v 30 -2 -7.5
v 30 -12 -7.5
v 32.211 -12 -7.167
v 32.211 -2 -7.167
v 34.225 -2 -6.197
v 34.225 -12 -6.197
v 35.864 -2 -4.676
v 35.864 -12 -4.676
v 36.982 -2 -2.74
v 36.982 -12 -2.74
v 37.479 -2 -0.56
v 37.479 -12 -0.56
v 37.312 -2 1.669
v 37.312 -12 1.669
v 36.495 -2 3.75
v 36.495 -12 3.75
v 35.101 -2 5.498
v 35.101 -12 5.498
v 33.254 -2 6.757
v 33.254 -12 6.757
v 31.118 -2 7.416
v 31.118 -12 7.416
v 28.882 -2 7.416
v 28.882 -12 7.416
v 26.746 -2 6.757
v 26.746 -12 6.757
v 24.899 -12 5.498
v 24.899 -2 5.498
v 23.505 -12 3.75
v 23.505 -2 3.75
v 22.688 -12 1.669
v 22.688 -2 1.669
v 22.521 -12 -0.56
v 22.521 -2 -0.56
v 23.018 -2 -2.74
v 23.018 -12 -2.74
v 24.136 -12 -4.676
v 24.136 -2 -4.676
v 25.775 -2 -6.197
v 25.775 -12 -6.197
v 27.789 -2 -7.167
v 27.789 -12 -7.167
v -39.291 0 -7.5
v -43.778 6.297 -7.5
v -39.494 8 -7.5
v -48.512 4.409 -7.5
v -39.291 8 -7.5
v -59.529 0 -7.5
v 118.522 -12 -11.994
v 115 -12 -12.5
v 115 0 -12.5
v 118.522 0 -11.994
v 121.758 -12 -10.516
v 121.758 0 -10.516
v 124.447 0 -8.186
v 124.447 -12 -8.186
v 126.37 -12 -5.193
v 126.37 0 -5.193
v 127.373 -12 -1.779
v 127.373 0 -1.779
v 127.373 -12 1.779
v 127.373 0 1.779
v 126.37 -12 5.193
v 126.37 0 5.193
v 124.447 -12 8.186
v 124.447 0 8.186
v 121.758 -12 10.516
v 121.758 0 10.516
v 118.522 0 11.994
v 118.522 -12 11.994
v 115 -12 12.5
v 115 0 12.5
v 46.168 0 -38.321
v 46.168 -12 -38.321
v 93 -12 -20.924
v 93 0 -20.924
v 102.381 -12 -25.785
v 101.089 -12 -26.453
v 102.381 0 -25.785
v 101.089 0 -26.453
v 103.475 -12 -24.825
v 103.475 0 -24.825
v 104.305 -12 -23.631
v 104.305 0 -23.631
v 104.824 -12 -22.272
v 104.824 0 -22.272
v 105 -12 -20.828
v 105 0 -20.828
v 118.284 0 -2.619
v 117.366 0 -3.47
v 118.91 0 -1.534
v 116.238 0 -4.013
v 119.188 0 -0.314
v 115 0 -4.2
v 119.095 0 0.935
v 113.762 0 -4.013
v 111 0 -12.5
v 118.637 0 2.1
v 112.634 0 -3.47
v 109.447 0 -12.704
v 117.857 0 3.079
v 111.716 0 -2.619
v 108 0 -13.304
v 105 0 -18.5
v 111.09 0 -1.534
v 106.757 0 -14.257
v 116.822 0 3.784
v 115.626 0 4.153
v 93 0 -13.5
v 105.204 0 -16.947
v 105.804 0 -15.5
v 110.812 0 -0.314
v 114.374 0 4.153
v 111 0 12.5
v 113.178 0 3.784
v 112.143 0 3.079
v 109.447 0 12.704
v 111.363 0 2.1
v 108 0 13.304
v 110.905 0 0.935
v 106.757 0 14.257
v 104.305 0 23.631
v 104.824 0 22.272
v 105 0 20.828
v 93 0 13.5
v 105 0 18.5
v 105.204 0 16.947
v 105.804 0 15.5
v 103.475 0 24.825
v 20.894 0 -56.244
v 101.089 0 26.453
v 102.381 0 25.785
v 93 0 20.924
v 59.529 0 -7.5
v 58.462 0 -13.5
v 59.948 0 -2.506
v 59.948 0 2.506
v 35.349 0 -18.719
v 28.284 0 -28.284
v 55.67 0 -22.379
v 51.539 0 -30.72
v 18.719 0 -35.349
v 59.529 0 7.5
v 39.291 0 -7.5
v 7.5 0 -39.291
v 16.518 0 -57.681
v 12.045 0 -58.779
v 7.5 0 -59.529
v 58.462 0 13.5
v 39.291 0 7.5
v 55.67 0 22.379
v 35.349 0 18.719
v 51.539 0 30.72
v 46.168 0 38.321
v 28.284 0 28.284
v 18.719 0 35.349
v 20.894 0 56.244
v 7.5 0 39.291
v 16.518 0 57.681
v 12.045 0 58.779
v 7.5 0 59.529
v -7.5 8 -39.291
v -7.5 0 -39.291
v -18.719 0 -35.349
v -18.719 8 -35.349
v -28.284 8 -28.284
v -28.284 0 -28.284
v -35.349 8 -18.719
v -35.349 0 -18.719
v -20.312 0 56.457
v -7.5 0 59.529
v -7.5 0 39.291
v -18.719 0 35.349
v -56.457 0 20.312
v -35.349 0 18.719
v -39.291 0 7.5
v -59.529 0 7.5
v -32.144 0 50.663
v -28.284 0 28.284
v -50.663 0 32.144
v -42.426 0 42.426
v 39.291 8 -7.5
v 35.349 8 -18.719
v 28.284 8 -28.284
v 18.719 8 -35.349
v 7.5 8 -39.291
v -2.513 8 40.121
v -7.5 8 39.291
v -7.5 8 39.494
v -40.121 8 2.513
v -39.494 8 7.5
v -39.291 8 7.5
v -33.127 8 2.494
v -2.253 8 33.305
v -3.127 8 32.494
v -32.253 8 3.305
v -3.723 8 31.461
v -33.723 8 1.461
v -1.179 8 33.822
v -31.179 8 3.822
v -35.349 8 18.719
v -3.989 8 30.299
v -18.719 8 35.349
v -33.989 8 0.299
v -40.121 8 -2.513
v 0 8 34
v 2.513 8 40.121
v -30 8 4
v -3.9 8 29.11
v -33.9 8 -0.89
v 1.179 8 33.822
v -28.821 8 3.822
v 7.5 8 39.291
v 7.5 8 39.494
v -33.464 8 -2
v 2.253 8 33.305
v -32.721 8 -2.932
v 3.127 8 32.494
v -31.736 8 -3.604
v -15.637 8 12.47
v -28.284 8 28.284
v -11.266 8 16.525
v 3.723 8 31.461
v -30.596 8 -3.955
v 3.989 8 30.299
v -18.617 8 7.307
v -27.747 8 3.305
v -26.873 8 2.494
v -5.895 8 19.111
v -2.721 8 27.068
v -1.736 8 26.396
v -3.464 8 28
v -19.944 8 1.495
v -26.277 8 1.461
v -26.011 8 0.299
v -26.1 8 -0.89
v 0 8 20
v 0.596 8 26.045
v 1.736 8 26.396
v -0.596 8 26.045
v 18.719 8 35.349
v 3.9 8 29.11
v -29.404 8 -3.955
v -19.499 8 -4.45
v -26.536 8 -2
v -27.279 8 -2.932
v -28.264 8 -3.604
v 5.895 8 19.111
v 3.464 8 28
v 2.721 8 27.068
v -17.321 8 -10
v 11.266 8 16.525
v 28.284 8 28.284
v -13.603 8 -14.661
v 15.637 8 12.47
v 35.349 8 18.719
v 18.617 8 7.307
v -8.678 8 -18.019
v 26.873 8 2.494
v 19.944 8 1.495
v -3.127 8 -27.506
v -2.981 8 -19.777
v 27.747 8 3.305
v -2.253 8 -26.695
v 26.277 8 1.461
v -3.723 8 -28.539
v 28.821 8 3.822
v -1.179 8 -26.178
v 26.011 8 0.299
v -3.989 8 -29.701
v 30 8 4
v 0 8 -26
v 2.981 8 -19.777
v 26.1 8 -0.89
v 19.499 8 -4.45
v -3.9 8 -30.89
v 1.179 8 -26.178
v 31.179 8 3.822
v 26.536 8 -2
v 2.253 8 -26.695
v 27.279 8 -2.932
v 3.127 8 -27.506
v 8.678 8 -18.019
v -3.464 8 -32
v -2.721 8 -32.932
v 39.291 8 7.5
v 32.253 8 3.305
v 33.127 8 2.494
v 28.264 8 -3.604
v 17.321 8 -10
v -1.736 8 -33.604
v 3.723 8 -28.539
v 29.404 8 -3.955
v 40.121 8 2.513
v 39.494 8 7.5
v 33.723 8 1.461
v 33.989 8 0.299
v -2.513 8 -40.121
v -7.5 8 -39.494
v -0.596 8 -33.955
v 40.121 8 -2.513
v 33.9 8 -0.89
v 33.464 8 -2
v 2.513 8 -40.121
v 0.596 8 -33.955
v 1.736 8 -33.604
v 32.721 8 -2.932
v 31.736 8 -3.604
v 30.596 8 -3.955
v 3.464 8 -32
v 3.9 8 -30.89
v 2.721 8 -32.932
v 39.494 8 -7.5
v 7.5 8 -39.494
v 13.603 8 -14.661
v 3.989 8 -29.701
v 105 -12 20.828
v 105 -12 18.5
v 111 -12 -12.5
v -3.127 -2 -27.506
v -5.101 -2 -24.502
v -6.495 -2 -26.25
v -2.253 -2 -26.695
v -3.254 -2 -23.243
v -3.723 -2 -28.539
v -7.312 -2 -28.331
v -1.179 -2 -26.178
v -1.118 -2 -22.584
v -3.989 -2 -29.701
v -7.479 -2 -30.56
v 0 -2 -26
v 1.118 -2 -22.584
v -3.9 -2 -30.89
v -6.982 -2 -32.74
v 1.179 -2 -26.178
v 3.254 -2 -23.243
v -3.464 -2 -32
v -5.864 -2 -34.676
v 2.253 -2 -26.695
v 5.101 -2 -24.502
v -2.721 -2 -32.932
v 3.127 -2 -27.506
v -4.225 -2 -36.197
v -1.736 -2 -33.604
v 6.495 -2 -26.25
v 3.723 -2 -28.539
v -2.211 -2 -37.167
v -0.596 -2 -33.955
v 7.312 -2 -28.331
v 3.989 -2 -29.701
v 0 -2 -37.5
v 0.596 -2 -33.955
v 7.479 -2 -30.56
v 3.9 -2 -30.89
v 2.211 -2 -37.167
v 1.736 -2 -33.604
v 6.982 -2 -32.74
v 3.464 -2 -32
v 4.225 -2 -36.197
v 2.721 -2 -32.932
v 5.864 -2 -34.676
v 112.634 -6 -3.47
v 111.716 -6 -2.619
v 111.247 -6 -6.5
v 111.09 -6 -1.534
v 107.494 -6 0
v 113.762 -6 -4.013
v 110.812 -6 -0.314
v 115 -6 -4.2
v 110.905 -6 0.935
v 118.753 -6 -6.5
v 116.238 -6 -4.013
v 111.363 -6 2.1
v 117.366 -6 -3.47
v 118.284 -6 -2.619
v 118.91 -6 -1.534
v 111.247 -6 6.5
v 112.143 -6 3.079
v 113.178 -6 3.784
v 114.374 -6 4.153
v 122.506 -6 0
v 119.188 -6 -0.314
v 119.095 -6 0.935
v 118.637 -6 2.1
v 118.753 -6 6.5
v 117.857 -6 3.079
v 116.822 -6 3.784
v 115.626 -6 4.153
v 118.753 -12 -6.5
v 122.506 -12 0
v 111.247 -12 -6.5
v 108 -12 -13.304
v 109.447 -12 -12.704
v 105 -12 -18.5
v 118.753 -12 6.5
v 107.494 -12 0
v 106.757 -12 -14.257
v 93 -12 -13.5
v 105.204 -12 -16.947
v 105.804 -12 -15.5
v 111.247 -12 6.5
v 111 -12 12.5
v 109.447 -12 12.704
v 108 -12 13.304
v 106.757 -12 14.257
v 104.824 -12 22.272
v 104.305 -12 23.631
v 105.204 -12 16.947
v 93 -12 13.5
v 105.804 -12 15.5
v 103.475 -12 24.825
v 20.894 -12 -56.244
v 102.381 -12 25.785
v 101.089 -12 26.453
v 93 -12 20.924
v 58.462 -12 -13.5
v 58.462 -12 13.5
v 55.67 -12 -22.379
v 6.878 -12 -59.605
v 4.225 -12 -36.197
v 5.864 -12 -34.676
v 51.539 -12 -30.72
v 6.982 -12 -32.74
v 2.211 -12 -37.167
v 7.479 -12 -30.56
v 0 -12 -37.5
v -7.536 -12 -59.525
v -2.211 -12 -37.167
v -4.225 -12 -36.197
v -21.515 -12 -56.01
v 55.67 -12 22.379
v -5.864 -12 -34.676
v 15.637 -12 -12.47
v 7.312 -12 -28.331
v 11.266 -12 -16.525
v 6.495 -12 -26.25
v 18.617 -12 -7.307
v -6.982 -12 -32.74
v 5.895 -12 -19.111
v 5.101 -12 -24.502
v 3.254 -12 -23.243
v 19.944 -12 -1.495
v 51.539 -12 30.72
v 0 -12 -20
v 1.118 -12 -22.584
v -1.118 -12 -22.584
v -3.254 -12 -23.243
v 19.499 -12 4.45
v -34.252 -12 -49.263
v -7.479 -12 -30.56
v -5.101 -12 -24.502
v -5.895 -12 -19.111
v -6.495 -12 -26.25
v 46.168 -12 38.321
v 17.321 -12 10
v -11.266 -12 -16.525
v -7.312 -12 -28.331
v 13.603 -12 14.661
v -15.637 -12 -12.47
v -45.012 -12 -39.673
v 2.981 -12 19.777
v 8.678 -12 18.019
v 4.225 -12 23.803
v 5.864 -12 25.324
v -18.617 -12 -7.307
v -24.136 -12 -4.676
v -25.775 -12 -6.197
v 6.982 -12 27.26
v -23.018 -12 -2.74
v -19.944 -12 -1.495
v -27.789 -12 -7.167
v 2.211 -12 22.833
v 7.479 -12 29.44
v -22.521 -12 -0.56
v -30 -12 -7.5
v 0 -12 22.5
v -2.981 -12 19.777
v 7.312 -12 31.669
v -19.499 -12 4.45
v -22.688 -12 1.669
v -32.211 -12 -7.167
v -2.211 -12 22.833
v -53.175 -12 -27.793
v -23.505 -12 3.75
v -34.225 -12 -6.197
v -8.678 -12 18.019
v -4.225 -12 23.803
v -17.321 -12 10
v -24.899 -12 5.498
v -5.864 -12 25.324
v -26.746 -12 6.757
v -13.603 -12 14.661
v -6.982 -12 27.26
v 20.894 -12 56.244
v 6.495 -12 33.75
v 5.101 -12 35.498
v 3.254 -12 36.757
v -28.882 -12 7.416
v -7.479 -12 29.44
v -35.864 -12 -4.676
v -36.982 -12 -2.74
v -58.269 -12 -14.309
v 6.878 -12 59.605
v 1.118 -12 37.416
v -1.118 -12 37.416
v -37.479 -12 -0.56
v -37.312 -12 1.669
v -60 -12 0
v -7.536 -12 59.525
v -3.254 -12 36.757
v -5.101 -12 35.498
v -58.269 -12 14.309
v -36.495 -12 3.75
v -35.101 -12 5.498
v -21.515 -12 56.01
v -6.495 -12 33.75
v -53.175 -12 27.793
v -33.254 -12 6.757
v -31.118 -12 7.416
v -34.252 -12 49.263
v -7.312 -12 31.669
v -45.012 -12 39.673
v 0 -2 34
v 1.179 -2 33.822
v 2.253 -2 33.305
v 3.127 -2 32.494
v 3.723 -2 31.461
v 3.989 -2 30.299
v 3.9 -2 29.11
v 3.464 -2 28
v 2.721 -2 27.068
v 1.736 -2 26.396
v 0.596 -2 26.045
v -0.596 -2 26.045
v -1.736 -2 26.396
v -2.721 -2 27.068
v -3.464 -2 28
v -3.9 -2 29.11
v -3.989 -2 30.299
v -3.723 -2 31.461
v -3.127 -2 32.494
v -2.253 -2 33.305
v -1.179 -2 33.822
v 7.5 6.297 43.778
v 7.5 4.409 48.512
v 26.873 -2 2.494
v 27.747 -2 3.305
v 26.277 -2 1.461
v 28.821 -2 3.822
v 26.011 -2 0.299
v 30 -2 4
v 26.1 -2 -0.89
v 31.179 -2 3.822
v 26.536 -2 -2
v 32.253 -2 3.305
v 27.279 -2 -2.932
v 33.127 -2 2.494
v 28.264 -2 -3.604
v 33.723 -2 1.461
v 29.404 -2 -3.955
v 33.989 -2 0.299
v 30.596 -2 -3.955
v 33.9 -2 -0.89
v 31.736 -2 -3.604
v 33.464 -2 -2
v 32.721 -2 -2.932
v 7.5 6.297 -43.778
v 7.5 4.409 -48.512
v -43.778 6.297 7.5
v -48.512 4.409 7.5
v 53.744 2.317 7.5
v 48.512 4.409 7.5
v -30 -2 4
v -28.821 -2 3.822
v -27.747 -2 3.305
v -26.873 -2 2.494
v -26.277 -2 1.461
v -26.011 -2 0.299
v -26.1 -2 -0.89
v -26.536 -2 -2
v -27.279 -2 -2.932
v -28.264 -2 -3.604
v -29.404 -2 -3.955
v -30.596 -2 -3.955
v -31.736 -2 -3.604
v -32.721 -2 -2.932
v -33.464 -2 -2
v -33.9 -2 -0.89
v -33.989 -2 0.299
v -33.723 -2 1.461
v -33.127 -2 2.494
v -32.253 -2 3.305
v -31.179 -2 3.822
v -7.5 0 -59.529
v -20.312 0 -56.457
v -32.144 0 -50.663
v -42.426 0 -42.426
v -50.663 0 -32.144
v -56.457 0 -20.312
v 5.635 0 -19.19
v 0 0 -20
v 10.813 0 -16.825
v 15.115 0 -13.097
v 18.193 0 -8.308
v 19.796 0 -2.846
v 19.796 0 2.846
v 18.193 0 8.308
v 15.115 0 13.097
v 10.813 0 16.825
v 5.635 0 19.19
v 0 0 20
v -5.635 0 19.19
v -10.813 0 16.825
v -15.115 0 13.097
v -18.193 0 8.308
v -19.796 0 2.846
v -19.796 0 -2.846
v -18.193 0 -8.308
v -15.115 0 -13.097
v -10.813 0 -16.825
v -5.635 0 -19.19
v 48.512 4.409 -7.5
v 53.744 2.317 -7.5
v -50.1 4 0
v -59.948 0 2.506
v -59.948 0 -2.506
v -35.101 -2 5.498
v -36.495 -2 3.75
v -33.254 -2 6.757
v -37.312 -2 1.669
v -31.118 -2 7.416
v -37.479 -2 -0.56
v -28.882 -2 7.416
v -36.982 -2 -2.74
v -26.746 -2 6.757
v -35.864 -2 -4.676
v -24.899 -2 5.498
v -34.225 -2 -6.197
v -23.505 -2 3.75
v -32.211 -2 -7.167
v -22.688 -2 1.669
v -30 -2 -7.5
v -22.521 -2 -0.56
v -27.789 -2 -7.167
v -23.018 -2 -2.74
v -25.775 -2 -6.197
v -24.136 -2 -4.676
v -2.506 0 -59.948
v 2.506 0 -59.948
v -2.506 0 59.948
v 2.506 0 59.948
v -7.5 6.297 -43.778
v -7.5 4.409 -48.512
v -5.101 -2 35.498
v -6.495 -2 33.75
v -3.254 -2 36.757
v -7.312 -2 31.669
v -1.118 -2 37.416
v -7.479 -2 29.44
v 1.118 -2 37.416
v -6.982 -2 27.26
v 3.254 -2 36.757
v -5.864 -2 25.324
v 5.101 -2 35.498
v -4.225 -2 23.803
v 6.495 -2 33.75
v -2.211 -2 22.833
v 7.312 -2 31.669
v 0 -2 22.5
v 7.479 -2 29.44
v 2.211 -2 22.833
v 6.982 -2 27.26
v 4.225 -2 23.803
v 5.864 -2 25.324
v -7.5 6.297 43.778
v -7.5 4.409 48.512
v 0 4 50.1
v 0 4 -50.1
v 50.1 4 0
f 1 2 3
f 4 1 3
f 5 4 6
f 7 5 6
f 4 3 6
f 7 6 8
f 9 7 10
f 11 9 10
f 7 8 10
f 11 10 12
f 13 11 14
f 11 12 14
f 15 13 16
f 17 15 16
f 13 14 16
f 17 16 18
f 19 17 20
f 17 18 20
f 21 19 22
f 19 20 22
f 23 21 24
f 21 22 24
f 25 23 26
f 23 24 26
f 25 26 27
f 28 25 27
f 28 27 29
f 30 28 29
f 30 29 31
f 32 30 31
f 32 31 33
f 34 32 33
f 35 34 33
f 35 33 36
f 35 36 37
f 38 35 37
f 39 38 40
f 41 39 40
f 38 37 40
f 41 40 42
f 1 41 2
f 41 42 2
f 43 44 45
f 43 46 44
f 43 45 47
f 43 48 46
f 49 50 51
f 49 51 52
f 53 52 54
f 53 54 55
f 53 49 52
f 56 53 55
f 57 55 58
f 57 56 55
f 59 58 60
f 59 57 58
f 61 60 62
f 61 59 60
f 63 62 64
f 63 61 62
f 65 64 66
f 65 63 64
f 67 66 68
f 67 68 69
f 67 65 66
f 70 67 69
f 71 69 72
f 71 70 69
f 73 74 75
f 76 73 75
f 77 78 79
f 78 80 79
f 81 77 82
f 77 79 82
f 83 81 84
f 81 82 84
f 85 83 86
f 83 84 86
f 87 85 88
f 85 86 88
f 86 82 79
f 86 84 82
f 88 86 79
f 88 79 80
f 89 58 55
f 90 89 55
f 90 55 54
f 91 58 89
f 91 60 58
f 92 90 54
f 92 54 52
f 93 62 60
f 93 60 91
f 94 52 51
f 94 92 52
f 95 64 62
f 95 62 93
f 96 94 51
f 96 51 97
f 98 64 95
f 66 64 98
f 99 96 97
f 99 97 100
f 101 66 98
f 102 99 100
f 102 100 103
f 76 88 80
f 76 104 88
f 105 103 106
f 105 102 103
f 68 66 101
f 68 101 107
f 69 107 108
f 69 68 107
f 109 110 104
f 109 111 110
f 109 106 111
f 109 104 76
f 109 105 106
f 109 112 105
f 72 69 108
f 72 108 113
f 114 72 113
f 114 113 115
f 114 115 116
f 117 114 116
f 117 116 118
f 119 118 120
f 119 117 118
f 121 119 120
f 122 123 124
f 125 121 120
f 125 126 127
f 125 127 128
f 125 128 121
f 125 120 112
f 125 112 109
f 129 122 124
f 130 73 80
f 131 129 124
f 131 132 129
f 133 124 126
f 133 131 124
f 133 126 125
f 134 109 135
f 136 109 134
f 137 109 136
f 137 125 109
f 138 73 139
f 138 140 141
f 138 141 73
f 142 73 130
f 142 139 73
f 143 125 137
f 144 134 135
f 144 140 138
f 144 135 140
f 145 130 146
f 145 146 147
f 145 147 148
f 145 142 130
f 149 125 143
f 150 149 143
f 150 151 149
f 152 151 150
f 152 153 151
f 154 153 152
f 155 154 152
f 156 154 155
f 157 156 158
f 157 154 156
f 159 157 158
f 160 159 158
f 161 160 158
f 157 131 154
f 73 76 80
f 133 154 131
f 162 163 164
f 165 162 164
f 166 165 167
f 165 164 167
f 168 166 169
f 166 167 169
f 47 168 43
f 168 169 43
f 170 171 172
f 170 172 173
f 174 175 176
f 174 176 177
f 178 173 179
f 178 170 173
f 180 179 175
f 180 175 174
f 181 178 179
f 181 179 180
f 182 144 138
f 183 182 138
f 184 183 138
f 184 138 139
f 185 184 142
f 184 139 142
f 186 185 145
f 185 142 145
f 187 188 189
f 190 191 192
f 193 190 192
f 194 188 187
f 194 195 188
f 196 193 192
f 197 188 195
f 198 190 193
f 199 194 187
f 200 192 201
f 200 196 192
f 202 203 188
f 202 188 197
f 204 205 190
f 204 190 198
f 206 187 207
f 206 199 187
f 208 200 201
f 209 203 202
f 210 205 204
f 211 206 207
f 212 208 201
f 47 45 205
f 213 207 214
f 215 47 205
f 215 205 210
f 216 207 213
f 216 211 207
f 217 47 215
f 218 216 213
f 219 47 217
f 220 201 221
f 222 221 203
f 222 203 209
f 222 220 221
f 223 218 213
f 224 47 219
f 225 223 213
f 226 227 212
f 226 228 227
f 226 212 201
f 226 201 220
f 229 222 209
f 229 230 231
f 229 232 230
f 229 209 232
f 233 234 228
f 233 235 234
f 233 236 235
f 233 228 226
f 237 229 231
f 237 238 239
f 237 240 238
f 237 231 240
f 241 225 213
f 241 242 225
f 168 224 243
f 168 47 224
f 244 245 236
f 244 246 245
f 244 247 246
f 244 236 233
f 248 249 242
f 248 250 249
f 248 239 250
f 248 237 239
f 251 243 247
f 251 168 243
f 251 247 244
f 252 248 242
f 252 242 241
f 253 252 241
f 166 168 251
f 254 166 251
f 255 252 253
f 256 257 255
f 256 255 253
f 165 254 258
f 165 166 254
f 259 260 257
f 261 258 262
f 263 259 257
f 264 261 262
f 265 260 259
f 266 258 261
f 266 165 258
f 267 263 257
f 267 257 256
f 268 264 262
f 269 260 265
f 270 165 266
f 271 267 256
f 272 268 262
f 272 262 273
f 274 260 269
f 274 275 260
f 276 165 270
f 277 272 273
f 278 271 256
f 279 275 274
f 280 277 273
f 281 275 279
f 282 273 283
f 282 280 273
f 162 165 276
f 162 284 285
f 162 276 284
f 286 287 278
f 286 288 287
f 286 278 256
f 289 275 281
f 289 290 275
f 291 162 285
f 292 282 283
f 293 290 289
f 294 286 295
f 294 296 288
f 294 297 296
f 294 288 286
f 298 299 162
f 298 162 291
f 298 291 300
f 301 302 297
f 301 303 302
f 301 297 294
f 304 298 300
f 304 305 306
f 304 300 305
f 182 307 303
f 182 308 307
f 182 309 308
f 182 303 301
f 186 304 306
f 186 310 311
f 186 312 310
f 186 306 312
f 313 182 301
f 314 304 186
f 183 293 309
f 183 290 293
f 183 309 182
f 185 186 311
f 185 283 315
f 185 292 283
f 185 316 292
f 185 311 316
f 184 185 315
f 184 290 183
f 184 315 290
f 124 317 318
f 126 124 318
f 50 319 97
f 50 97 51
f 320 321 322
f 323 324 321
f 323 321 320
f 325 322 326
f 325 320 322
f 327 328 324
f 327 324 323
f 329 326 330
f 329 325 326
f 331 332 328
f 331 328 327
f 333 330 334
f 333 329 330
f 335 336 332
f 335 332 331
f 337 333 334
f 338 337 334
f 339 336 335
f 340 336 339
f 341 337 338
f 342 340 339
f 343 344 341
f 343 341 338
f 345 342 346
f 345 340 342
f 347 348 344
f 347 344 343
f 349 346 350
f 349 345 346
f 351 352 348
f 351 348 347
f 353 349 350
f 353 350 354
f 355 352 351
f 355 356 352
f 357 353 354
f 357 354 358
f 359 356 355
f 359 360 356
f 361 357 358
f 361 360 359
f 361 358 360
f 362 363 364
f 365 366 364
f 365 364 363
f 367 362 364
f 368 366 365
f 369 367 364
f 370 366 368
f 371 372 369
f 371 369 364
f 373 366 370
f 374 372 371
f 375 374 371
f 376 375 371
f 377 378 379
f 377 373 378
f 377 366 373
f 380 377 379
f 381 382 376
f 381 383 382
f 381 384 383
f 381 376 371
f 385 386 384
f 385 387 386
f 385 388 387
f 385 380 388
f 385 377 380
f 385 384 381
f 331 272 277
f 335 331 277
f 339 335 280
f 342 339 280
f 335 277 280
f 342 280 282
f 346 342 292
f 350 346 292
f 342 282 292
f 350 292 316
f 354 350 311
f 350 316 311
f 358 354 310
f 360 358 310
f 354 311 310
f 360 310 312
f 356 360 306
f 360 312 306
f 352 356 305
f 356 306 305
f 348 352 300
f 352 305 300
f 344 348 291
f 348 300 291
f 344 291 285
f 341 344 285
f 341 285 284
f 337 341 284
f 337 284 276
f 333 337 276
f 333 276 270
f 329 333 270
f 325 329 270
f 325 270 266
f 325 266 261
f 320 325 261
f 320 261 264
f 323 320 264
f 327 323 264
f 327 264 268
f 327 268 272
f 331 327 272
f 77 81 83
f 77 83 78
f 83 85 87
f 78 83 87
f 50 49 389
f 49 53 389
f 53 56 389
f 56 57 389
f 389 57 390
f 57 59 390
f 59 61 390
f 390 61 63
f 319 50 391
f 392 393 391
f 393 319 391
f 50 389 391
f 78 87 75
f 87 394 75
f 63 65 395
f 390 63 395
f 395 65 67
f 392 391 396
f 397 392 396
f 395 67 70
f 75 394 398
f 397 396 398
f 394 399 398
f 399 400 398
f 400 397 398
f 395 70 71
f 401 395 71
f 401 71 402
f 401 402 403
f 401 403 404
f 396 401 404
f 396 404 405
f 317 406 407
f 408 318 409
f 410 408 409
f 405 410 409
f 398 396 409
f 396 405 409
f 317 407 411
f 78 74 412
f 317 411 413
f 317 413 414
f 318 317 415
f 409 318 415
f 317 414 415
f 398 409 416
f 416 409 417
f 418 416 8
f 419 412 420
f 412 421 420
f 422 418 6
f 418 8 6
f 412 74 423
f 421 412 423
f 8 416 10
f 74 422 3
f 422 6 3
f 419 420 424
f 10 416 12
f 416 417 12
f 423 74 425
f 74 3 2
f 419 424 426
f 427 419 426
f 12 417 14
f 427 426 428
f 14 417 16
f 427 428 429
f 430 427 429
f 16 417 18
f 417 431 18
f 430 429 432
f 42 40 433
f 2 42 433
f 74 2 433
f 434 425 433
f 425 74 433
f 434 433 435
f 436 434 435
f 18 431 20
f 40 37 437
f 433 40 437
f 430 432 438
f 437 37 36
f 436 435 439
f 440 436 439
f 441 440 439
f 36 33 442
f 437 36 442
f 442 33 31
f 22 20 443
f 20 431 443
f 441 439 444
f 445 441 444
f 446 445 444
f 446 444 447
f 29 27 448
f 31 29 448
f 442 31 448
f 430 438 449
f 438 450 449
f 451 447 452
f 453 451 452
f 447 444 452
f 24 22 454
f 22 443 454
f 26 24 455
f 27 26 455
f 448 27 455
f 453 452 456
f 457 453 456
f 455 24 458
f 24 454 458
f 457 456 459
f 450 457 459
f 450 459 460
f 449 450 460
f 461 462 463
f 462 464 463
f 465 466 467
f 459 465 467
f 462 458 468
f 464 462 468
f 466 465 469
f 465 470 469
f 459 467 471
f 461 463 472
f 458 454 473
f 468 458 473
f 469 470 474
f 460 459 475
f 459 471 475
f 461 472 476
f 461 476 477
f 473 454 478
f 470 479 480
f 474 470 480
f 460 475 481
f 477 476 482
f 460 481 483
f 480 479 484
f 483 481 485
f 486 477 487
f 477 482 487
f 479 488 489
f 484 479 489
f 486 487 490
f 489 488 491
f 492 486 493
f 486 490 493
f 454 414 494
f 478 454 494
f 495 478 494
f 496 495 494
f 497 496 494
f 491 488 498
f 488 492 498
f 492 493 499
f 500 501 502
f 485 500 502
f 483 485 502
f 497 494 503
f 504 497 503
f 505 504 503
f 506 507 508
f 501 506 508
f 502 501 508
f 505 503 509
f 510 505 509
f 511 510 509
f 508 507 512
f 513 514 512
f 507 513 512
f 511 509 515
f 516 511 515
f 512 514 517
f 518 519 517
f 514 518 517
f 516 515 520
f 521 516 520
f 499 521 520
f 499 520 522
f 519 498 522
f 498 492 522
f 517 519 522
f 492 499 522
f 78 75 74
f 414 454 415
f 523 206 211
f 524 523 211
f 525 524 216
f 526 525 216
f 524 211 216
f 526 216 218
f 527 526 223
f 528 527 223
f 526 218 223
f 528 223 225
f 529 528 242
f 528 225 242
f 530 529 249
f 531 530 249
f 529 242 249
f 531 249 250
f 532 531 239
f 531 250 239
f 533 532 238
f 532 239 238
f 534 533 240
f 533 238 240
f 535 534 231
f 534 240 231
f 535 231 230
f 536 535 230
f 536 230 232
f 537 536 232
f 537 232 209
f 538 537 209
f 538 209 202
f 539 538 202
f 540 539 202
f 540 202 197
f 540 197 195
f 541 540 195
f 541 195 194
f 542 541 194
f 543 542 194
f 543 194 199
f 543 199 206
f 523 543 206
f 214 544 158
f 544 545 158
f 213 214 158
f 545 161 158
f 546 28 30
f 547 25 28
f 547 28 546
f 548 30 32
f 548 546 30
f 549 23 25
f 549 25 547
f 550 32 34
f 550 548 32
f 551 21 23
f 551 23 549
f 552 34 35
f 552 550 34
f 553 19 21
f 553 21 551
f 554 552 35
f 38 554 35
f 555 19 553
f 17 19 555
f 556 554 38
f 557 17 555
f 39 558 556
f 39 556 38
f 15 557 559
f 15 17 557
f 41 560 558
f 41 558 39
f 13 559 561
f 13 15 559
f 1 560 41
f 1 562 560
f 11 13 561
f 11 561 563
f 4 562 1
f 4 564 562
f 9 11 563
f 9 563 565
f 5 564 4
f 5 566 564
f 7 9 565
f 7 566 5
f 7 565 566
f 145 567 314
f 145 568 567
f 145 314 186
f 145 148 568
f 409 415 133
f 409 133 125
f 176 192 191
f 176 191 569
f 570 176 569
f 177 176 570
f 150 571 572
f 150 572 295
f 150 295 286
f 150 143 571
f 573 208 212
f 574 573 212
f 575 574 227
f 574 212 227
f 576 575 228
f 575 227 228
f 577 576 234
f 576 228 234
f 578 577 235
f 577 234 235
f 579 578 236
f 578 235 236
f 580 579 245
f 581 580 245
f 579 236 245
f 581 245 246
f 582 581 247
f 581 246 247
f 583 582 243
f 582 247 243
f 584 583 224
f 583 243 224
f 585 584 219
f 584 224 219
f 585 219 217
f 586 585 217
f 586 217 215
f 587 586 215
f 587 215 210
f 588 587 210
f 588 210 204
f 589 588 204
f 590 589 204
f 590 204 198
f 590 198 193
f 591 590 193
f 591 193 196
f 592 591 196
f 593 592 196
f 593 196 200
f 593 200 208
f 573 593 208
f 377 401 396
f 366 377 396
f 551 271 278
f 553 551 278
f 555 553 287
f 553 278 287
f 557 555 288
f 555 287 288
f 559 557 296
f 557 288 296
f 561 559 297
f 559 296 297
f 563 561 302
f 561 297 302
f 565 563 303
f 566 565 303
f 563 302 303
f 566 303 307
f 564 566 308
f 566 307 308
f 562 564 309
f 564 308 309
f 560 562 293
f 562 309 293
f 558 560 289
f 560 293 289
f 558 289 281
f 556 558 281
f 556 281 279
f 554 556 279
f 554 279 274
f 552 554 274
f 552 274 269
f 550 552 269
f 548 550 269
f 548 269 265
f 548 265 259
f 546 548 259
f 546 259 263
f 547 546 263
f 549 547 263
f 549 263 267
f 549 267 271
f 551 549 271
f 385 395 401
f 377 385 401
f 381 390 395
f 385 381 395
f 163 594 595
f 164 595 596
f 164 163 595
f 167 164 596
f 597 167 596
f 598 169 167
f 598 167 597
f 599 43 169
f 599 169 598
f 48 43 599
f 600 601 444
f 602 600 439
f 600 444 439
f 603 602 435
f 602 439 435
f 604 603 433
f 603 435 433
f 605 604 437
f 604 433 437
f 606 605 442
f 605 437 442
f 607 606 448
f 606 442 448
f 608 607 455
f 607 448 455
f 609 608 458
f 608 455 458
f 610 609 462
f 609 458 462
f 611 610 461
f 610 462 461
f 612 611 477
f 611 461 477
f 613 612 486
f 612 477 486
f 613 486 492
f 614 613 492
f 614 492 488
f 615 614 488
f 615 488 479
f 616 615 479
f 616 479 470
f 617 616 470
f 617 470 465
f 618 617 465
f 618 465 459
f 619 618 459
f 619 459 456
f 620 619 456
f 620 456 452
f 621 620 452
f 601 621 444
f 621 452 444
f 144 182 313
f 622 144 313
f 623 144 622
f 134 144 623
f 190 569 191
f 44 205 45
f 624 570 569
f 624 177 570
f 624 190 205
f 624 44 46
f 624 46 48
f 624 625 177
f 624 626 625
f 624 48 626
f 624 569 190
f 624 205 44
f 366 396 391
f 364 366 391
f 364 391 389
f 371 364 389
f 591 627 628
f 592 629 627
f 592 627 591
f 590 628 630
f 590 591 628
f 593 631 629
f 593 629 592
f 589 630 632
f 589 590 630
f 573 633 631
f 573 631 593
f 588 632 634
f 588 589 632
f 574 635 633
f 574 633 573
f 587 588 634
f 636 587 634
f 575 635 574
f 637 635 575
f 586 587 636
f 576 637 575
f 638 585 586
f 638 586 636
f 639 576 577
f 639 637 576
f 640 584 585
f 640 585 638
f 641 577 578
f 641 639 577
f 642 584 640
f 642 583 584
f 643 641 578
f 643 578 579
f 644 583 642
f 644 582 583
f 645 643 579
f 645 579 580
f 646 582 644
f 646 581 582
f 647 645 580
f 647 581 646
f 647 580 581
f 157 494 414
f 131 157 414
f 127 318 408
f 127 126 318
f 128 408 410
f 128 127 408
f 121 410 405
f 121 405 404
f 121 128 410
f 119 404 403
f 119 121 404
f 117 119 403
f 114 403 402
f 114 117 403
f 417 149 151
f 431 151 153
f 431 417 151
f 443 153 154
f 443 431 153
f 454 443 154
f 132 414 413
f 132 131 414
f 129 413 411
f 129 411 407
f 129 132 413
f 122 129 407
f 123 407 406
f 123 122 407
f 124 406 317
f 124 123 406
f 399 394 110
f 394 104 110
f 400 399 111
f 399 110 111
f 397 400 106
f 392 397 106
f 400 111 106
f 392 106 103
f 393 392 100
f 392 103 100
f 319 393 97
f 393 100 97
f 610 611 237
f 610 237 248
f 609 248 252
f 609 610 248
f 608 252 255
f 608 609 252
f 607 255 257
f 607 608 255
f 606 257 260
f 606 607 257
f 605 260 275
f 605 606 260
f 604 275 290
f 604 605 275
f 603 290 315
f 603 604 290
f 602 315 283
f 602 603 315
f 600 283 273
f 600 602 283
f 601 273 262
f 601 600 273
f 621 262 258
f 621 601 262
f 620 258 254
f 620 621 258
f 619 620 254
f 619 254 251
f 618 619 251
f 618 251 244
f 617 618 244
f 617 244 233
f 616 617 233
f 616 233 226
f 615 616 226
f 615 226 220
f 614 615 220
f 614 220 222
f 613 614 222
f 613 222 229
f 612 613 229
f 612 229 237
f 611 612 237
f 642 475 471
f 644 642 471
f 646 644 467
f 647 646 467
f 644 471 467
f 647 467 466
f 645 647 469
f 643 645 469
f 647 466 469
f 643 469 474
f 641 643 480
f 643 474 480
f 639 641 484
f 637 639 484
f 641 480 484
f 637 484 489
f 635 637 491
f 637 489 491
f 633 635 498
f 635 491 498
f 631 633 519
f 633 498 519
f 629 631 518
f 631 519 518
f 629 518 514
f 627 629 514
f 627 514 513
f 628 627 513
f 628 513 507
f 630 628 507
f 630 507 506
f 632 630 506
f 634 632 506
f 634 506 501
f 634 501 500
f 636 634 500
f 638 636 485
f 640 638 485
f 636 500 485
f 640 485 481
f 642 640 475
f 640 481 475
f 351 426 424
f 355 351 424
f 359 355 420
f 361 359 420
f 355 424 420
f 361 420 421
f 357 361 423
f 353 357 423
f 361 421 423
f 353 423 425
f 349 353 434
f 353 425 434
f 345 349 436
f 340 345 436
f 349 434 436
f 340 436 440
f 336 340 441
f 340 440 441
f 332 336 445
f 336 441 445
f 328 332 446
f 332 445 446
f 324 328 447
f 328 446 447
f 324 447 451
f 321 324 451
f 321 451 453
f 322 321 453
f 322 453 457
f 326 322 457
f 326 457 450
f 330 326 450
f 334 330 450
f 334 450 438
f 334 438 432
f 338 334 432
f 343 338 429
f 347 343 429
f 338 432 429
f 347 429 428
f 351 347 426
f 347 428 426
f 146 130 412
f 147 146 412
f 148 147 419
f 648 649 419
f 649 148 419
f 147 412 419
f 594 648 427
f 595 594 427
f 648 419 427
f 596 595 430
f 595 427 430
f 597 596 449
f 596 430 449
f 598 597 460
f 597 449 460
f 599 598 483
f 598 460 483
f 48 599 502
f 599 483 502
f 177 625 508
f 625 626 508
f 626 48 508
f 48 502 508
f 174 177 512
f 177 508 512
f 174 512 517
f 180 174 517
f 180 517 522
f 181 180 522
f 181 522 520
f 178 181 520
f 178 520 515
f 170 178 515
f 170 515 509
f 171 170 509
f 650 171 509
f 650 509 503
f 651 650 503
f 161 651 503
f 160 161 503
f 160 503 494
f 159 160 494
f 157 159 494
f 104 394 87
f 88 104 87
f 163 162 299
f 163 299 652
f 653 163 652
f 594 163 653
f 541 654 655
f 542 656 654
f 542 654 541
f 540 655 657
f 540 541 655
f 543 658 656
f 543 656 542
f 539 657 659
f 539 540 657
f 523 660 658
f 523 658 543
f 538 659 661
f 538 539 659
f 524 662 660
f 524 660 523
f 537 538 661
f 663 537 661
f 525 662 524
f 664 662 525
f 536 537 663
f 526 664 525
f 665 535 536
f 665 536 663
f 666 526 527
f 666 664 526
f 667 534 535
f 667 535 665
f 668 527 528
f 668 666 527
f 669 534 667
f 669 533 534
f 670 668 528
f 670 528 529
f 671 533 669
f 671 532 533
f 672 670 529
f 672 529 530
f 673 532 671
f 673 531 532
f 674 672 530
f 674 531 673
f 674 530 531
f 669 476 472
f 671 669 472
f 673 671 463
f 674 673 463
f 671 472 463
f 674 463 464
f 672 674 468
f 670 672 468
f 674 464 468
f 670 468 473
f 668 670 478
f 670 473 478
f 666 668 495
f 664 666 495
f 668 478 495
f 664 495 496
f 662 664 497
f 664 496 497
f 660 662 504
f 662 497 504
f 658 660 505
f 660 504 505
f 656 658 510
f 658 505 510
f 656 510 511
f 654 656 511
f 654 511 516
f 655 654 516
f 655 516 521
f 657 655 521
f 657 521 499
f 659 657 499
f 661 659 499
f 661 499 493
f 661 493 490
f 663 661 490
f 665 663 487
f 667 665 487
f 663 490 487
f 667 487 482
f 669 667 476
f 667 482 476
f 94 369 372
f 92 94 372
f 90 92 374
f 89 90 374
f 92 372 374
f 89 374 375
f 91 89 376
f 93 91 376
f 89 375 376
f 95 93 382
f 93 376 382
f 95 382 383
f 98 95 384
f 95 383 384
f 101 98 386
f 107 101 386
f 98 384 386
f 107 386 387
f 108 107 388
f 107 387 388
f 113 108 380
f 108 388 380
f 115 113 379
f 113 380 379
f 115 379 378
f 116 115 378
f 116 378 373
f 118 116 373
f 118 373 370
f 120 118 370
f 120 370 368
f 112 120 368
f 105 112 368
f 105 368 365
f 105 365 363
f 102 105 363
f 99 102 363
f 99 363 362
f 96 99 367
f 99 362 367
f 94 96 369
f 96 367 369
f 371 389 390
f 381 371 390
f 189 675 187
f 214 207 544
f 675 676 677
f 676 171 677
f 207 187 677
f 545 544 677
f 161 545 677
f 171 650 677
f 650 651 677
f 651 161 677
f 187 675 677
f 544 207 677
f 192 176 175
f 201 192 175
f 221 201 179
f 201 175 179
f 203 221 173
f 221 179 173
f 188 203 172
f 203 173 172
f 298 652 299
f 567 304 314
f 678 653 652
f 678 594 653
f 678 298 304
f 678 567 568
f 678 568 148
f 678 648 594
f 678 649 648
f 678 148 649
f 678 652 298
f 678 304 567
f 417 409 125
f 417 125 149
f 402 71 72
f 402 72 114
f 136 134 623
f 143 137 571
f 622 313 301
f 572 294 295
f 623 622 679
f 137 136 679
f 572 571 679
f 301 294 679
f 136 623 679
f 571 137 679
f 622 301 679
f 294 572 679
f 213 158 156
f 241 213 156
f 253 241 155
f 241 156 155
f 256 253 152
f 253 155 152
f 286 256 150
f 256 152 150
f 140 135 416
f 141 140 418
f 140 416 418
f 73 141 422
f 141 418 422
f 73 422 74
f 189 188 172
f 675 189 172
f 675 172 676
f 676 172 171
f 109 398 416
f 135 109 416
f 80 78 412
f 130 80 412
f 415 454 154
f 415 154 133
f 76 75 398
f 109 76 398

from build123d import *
from OCP.BRepFilletAPI import BRepFilletAPI_MakeChamfer
from build123d.topology import SkipClean

# Parameters (mm, degrees)
SKETCH1_R           = 40
SKETCH1_R_2         = 20
BOSS_EXTRUDE1_DEPTH = 8
BOSS_EXTRUDE2_START = 12
SKETCH3_R           = 20
BOSS_EXTRUDE2_DEPTH = 12
SKETCH5_R           = 7.5
CUT_EXTRUDE3_DEPTH  = 10
SKETCH2_R           = 4
CUT_EXTRUDE1_DEPTH  = 20
BOSS_EXTRUDE3_DEPTH = 8
CHAMFER1_SIZE       = 19.800694827
CHAMFER1_SIZE_2     = 8
BOSS_EXTRUDE4_DEPTH = 12
FILLET1_R           = 6
CUT_EXTRUDE4_DEPTH  = 6
SKETCH9_R           = 4.2
CUT_EXTRUDE5_DEPTH  = 6
CUT_EXTRUDE7_START  = -12
CUT_EXTRUDE7_DEPTH  = 12


with BuildPart() as part:
    # Sketch1 → Boss-Extrude1 (new body)
    with BuildSketch(Plane(origin=(0, 0, 0), x_dir=(1, 0, 0), z_dir=(0, 1, 0))):
        with Locations(Location((0, 0, 0), (0, 0, 270))):
            Circle(SKETCH1_R)
        with Locations(Location((0, 0, 0), (0, 0, 270))):
            Circle(SKETCH1_R_2, mode=Mode.SUBTRACT)
    extrude(amount=BOSS_EXTRUDE1_DEPTH)

    # Sketch3 → Boss-Extrude2 (add)
    with SkipClean():  # the faces are left unmerged after this step: merging them gives an invalid solid
        with BuildSketch(Plane.XZ.offset(BOSS_EXTRUDE2_START)):
            with BuildLine():
                Line((20.894189842, 56.244402662), (105, 25))
                Line((105, 25), (105, -25))
                Line((105, -25), (20.894189842, -56.244402662))
                ThreePointArc((20.894189842, -56.244402662), (-60, 0), (20.894189842, 56.244402662))
            make_face()
            with Locations(Location((0, 0, 0), (0, 0, 270))):
                Circle(SKETCH3_R, mode=Mode.SUBTRACT)
        extrude(amount=-BOSS_EXTRUDE2_DEPTH)

    # Sketch5 → Cut-Extrude3 (cut)
    with SkipClean():  # the faces are left unmerged after this step: merging them gives an invalid solid
        with BuildSketch(Plane.XZ.offset(12)):
            with Locations(Location((0, 30, 0), (0, 0, 270))):
                Circle(SKETCH5_R)
            with Locations(Location((30, 0, 0), (0, 0, 270))):
                Circle(SKETCH5_R)
            with Locations(Location((0, -30, 0), (0, 0, 270))):
                Circle(SKETCH5_R)
            with Locations(Location((-30, 0, 0), (0, 0, 270))):
                Circle(SKETCH5_R)
        extrude(amount=-CUT_EXTRUDE3_DEPTH, mode=Mode.SUBTRACT)

    # Sketch2 → Cut-Extrude1 (cut)
    with SkipClean():  # the faces are left unmerged after this step: merging them gives an invalid solid
        with BuildSketch(Plane(origin=(0, 8, 0), x_dir=(1, 0, 0), z_dir=(0, 1, 0))):
            with Locations(Location((30, 0, 0), (0, 0, 270))):
                Circle(SKETCH2_R)
            with Locations(Location((0, -30, 0), (0, 0, 270))):
                Circle(SKETCH2_R)
            with Locations(Location((-30, 0, 0), (0, 0, 270))):
                Circle(SKETCH2_R)
            with Locations(Location((0, 30, 0), (0, 0, 270))):
                Circle(SKETCH2_R)
        extrude(amount=-CUT_EXTRUDE1_DEPTH, mode=Mode.SUBTRACT)

    # Sketch6 → Boss-Extrude3 (add)
    with SkipClean():  # the faces are left unmerged after this step: merging them gives an invalid solid
        with BuildSketch(Plane(origin=(0, 0, 0), x_dir=(1, 0, 0), z_dir=(0, 1, 0))):
            with BuildLine():
                Line((-7.5, -39.290584114), (-7.5, -59.529404499))
                ThreePointArc((-7.5, -59.529404499), (0, -60), (7.5, -59.529404499))
                Line((7.5, -59.529404499), (7.5, -39.290584114))
                ThreePointArc((7.5, -39.290584114), (0, -40), (-7.5, -39.290584114))
            make_face()
            with BuildLine():
                Line((-39.290584114, -7.5), (-59.529404499, -7.5))
                ThreePointArc((-59.529404499, -7.5), (-60, 0), (-59.529404499, 7.5))
                Line((-59.529404499, 7.5), (-39.290584114, 7.5))
                ThreePointArc((-39.290584114, 7.5), (-40, 0), (-39.290584114, -7.5))
            make_face()
            with BuildLine():
                Line((-7.5, 39.290584114), (-7.5, 59.529404499))
                ThreePointArc((-7.5, 59.529404499), (0, 60), (7.5, 59.529404499))
                Line((7.5, 59.529404499), (7.5, 39.290584114))
                ThreePointArc((7.5, 39.290584114), (0, 40), (-7.5, 39.290584114))
            make_face()
            with BuildLine():
                Line((39.290584114, 7.5), (59.529404499, 7.5))
                ThreePointArc((59.529404499, 7.5), (60, 0), (59.529404499, -7.5))
                Line((59.529404499, -7.5), (39.290584114, -7.5))
                ThreePointArc((39.290584114, -7.5), (40, 0), (39.290584114, 7.5))
            make_face()
        extrude(amount=BOSS_EXTRUDE3_DEPTH)

    # Chamfer1
    chamfer1_edges_1 = [part.edges().sort_by_distance(p)[0] for p in [
        (0, 8, -60),
    ]]
    chamfer1_side_1 = [part.faces().sort_by_distance(p)[0] for p in [
        (0, 8, -59.84),
    ]]
    chamfer1_edges_2 = [part.edges().sort_by_distance(p)[0] for p in [
        (60, 8, 0),
    ]]
    chamfer1_side_2 = [part.faces().sort_by_distance(p)[0] for p in [
        (60, 7.84, 0),
    ]]
    chamfer1_edges_3 = [part.edges().sort_by_distance(p)[0] for p in [
        (0, 8, 60),
    ]]
    chamfer1_side_3 = [part.faces().sort_by_distance(p)[0] for p in [
        (0, 8, 59.84),
    ]]
    chamfer1_edges_4 = [part.edges().sort_by_distance(p)[0] for p in [
        (-60, 8, 0),
    ]]
    chamfer1_side_4 = [part.faces().sort_by_distance(p)[0] for p in [
        (-59.84, 8, 0),
    ]]
    chamfer1 = BRepFilletAPI_MakeChamfer(part.part.solid().wrapped)
    for e in chamfer1_edges_1:
        chamfer1.Add(CHAMFER1_SIZE - 0.0001, CHAMFER1_SIZE_2 - 0.0001, e.wrapped, chamfer1_side_1[0].wrapped)
    for e in chamfer1_edges_2:
        chamfer1.Add(CHAMFER1_SIZE_2 - 0.0001, CHAMFER1_SIZE - 0.0001, e.wrapped, chamfer1_side_2[0].wrapped)
    for e in chamfer1_edges_3:
        chamfer1.Add(CHAMFER1_SIZE - 0.0001, CHAMFER1_SIZE_2 - 0.0001, e.wrapped, chamfer1_side_3[0].wrapped)
    for e in chamfer1_edges_4:
        chamfer1.Add(CHAMFER1_SIZE - 0.0001, CHAMFER1_SIZE_2 - 0.0001, e.wrapped, chamfer1_side_4[0].wrapped)
    add(Compound.cast(chamfer1.Shape()), mode=Mode.REPLACE)  # a hair under: the kernel refuses the full size

    # Sketch7 → Boss-Extrude4 (add)
    with BuildSketch(Plane.XZ.offset(12)):
        with BuildLine():
            Line((115, 12.5), (105, 12.5))
            Line((105, 12.5), (105, -12.5))
            Line((105, -12.5), (115, -12.5))
            ThreePointArc((115, -12.5), (127.5, 0), (115, 12.5))
        make_face()
    extrude(amount=-BOSS_EXTRUDE4_DEPTH)

    # Fillet1
    fillet1_edges = [part.edges().sort_by_distance(p)[0] for p in [
        (105, -6, -25),
        (105, -6, 25),
        (105, -6, -12.5),
        (105, -6, 12.5),
    ]]
    fillet(fillet1_edges, radius=FILLET1_R)

    # Sketch8 → Cut-Extrude4 (cut)
    with BuildSketch(Plane.XZ.offset(12)):
        Polygon((111.24722325, -6.5), (118.75277675, -6.5), (122.505553499, 0), (118.75277675, 6.5), (111.24722325, 6.5), (107.494446501, 0), align=None)
    extrude(amount=-CUT_EXTRUDE4_DEPTH, mode=Mode.SUBTRACT)

    # Sketch9 → Cut-Extrude5 (cut)
    with BuildSketch(Plane.XZ.offset(6)):
        with Locations(Location((115, 0, 0), (0, 0, 270))):
            Circle(SKETCH9_R)
    extrude(amount=-CUT_EXTRUDE5_DEPTH, mode=Mode.SUBTRACT)

    # Sketch11 → Cut-Extrude7 (cut)
    with BuildSketch(Plane(origin=(0, 0, 0), x_dir=(1, 0, 0), z_dir=(0, 1, 0)).offset(CUT_EXTRUDE7_START)):
        with BuildLine():
            Line((93, 20.923688206), (93, 13.5))
            Line((93, 13.5), (58.46152581, 13.5))
            ThreePointArc((58.46152581, 13.5), (53.766674065, 26.62977206), (46.167935821, 38.321295672))
            Line((46.167935821, 38.321295672), (93, 20.923688206))
        make_face()
    cut_extrude7 = extrude(amount=CUT_EXTRUDE7_DEPTH, mode=Mode.SUBTRACT)

    # Mirror1: Cut-Extrude7 across plane
    add(cut_extrude7.mirror(Plane.XY), mode=Mode.SUBTRACT)


solid = part.part
